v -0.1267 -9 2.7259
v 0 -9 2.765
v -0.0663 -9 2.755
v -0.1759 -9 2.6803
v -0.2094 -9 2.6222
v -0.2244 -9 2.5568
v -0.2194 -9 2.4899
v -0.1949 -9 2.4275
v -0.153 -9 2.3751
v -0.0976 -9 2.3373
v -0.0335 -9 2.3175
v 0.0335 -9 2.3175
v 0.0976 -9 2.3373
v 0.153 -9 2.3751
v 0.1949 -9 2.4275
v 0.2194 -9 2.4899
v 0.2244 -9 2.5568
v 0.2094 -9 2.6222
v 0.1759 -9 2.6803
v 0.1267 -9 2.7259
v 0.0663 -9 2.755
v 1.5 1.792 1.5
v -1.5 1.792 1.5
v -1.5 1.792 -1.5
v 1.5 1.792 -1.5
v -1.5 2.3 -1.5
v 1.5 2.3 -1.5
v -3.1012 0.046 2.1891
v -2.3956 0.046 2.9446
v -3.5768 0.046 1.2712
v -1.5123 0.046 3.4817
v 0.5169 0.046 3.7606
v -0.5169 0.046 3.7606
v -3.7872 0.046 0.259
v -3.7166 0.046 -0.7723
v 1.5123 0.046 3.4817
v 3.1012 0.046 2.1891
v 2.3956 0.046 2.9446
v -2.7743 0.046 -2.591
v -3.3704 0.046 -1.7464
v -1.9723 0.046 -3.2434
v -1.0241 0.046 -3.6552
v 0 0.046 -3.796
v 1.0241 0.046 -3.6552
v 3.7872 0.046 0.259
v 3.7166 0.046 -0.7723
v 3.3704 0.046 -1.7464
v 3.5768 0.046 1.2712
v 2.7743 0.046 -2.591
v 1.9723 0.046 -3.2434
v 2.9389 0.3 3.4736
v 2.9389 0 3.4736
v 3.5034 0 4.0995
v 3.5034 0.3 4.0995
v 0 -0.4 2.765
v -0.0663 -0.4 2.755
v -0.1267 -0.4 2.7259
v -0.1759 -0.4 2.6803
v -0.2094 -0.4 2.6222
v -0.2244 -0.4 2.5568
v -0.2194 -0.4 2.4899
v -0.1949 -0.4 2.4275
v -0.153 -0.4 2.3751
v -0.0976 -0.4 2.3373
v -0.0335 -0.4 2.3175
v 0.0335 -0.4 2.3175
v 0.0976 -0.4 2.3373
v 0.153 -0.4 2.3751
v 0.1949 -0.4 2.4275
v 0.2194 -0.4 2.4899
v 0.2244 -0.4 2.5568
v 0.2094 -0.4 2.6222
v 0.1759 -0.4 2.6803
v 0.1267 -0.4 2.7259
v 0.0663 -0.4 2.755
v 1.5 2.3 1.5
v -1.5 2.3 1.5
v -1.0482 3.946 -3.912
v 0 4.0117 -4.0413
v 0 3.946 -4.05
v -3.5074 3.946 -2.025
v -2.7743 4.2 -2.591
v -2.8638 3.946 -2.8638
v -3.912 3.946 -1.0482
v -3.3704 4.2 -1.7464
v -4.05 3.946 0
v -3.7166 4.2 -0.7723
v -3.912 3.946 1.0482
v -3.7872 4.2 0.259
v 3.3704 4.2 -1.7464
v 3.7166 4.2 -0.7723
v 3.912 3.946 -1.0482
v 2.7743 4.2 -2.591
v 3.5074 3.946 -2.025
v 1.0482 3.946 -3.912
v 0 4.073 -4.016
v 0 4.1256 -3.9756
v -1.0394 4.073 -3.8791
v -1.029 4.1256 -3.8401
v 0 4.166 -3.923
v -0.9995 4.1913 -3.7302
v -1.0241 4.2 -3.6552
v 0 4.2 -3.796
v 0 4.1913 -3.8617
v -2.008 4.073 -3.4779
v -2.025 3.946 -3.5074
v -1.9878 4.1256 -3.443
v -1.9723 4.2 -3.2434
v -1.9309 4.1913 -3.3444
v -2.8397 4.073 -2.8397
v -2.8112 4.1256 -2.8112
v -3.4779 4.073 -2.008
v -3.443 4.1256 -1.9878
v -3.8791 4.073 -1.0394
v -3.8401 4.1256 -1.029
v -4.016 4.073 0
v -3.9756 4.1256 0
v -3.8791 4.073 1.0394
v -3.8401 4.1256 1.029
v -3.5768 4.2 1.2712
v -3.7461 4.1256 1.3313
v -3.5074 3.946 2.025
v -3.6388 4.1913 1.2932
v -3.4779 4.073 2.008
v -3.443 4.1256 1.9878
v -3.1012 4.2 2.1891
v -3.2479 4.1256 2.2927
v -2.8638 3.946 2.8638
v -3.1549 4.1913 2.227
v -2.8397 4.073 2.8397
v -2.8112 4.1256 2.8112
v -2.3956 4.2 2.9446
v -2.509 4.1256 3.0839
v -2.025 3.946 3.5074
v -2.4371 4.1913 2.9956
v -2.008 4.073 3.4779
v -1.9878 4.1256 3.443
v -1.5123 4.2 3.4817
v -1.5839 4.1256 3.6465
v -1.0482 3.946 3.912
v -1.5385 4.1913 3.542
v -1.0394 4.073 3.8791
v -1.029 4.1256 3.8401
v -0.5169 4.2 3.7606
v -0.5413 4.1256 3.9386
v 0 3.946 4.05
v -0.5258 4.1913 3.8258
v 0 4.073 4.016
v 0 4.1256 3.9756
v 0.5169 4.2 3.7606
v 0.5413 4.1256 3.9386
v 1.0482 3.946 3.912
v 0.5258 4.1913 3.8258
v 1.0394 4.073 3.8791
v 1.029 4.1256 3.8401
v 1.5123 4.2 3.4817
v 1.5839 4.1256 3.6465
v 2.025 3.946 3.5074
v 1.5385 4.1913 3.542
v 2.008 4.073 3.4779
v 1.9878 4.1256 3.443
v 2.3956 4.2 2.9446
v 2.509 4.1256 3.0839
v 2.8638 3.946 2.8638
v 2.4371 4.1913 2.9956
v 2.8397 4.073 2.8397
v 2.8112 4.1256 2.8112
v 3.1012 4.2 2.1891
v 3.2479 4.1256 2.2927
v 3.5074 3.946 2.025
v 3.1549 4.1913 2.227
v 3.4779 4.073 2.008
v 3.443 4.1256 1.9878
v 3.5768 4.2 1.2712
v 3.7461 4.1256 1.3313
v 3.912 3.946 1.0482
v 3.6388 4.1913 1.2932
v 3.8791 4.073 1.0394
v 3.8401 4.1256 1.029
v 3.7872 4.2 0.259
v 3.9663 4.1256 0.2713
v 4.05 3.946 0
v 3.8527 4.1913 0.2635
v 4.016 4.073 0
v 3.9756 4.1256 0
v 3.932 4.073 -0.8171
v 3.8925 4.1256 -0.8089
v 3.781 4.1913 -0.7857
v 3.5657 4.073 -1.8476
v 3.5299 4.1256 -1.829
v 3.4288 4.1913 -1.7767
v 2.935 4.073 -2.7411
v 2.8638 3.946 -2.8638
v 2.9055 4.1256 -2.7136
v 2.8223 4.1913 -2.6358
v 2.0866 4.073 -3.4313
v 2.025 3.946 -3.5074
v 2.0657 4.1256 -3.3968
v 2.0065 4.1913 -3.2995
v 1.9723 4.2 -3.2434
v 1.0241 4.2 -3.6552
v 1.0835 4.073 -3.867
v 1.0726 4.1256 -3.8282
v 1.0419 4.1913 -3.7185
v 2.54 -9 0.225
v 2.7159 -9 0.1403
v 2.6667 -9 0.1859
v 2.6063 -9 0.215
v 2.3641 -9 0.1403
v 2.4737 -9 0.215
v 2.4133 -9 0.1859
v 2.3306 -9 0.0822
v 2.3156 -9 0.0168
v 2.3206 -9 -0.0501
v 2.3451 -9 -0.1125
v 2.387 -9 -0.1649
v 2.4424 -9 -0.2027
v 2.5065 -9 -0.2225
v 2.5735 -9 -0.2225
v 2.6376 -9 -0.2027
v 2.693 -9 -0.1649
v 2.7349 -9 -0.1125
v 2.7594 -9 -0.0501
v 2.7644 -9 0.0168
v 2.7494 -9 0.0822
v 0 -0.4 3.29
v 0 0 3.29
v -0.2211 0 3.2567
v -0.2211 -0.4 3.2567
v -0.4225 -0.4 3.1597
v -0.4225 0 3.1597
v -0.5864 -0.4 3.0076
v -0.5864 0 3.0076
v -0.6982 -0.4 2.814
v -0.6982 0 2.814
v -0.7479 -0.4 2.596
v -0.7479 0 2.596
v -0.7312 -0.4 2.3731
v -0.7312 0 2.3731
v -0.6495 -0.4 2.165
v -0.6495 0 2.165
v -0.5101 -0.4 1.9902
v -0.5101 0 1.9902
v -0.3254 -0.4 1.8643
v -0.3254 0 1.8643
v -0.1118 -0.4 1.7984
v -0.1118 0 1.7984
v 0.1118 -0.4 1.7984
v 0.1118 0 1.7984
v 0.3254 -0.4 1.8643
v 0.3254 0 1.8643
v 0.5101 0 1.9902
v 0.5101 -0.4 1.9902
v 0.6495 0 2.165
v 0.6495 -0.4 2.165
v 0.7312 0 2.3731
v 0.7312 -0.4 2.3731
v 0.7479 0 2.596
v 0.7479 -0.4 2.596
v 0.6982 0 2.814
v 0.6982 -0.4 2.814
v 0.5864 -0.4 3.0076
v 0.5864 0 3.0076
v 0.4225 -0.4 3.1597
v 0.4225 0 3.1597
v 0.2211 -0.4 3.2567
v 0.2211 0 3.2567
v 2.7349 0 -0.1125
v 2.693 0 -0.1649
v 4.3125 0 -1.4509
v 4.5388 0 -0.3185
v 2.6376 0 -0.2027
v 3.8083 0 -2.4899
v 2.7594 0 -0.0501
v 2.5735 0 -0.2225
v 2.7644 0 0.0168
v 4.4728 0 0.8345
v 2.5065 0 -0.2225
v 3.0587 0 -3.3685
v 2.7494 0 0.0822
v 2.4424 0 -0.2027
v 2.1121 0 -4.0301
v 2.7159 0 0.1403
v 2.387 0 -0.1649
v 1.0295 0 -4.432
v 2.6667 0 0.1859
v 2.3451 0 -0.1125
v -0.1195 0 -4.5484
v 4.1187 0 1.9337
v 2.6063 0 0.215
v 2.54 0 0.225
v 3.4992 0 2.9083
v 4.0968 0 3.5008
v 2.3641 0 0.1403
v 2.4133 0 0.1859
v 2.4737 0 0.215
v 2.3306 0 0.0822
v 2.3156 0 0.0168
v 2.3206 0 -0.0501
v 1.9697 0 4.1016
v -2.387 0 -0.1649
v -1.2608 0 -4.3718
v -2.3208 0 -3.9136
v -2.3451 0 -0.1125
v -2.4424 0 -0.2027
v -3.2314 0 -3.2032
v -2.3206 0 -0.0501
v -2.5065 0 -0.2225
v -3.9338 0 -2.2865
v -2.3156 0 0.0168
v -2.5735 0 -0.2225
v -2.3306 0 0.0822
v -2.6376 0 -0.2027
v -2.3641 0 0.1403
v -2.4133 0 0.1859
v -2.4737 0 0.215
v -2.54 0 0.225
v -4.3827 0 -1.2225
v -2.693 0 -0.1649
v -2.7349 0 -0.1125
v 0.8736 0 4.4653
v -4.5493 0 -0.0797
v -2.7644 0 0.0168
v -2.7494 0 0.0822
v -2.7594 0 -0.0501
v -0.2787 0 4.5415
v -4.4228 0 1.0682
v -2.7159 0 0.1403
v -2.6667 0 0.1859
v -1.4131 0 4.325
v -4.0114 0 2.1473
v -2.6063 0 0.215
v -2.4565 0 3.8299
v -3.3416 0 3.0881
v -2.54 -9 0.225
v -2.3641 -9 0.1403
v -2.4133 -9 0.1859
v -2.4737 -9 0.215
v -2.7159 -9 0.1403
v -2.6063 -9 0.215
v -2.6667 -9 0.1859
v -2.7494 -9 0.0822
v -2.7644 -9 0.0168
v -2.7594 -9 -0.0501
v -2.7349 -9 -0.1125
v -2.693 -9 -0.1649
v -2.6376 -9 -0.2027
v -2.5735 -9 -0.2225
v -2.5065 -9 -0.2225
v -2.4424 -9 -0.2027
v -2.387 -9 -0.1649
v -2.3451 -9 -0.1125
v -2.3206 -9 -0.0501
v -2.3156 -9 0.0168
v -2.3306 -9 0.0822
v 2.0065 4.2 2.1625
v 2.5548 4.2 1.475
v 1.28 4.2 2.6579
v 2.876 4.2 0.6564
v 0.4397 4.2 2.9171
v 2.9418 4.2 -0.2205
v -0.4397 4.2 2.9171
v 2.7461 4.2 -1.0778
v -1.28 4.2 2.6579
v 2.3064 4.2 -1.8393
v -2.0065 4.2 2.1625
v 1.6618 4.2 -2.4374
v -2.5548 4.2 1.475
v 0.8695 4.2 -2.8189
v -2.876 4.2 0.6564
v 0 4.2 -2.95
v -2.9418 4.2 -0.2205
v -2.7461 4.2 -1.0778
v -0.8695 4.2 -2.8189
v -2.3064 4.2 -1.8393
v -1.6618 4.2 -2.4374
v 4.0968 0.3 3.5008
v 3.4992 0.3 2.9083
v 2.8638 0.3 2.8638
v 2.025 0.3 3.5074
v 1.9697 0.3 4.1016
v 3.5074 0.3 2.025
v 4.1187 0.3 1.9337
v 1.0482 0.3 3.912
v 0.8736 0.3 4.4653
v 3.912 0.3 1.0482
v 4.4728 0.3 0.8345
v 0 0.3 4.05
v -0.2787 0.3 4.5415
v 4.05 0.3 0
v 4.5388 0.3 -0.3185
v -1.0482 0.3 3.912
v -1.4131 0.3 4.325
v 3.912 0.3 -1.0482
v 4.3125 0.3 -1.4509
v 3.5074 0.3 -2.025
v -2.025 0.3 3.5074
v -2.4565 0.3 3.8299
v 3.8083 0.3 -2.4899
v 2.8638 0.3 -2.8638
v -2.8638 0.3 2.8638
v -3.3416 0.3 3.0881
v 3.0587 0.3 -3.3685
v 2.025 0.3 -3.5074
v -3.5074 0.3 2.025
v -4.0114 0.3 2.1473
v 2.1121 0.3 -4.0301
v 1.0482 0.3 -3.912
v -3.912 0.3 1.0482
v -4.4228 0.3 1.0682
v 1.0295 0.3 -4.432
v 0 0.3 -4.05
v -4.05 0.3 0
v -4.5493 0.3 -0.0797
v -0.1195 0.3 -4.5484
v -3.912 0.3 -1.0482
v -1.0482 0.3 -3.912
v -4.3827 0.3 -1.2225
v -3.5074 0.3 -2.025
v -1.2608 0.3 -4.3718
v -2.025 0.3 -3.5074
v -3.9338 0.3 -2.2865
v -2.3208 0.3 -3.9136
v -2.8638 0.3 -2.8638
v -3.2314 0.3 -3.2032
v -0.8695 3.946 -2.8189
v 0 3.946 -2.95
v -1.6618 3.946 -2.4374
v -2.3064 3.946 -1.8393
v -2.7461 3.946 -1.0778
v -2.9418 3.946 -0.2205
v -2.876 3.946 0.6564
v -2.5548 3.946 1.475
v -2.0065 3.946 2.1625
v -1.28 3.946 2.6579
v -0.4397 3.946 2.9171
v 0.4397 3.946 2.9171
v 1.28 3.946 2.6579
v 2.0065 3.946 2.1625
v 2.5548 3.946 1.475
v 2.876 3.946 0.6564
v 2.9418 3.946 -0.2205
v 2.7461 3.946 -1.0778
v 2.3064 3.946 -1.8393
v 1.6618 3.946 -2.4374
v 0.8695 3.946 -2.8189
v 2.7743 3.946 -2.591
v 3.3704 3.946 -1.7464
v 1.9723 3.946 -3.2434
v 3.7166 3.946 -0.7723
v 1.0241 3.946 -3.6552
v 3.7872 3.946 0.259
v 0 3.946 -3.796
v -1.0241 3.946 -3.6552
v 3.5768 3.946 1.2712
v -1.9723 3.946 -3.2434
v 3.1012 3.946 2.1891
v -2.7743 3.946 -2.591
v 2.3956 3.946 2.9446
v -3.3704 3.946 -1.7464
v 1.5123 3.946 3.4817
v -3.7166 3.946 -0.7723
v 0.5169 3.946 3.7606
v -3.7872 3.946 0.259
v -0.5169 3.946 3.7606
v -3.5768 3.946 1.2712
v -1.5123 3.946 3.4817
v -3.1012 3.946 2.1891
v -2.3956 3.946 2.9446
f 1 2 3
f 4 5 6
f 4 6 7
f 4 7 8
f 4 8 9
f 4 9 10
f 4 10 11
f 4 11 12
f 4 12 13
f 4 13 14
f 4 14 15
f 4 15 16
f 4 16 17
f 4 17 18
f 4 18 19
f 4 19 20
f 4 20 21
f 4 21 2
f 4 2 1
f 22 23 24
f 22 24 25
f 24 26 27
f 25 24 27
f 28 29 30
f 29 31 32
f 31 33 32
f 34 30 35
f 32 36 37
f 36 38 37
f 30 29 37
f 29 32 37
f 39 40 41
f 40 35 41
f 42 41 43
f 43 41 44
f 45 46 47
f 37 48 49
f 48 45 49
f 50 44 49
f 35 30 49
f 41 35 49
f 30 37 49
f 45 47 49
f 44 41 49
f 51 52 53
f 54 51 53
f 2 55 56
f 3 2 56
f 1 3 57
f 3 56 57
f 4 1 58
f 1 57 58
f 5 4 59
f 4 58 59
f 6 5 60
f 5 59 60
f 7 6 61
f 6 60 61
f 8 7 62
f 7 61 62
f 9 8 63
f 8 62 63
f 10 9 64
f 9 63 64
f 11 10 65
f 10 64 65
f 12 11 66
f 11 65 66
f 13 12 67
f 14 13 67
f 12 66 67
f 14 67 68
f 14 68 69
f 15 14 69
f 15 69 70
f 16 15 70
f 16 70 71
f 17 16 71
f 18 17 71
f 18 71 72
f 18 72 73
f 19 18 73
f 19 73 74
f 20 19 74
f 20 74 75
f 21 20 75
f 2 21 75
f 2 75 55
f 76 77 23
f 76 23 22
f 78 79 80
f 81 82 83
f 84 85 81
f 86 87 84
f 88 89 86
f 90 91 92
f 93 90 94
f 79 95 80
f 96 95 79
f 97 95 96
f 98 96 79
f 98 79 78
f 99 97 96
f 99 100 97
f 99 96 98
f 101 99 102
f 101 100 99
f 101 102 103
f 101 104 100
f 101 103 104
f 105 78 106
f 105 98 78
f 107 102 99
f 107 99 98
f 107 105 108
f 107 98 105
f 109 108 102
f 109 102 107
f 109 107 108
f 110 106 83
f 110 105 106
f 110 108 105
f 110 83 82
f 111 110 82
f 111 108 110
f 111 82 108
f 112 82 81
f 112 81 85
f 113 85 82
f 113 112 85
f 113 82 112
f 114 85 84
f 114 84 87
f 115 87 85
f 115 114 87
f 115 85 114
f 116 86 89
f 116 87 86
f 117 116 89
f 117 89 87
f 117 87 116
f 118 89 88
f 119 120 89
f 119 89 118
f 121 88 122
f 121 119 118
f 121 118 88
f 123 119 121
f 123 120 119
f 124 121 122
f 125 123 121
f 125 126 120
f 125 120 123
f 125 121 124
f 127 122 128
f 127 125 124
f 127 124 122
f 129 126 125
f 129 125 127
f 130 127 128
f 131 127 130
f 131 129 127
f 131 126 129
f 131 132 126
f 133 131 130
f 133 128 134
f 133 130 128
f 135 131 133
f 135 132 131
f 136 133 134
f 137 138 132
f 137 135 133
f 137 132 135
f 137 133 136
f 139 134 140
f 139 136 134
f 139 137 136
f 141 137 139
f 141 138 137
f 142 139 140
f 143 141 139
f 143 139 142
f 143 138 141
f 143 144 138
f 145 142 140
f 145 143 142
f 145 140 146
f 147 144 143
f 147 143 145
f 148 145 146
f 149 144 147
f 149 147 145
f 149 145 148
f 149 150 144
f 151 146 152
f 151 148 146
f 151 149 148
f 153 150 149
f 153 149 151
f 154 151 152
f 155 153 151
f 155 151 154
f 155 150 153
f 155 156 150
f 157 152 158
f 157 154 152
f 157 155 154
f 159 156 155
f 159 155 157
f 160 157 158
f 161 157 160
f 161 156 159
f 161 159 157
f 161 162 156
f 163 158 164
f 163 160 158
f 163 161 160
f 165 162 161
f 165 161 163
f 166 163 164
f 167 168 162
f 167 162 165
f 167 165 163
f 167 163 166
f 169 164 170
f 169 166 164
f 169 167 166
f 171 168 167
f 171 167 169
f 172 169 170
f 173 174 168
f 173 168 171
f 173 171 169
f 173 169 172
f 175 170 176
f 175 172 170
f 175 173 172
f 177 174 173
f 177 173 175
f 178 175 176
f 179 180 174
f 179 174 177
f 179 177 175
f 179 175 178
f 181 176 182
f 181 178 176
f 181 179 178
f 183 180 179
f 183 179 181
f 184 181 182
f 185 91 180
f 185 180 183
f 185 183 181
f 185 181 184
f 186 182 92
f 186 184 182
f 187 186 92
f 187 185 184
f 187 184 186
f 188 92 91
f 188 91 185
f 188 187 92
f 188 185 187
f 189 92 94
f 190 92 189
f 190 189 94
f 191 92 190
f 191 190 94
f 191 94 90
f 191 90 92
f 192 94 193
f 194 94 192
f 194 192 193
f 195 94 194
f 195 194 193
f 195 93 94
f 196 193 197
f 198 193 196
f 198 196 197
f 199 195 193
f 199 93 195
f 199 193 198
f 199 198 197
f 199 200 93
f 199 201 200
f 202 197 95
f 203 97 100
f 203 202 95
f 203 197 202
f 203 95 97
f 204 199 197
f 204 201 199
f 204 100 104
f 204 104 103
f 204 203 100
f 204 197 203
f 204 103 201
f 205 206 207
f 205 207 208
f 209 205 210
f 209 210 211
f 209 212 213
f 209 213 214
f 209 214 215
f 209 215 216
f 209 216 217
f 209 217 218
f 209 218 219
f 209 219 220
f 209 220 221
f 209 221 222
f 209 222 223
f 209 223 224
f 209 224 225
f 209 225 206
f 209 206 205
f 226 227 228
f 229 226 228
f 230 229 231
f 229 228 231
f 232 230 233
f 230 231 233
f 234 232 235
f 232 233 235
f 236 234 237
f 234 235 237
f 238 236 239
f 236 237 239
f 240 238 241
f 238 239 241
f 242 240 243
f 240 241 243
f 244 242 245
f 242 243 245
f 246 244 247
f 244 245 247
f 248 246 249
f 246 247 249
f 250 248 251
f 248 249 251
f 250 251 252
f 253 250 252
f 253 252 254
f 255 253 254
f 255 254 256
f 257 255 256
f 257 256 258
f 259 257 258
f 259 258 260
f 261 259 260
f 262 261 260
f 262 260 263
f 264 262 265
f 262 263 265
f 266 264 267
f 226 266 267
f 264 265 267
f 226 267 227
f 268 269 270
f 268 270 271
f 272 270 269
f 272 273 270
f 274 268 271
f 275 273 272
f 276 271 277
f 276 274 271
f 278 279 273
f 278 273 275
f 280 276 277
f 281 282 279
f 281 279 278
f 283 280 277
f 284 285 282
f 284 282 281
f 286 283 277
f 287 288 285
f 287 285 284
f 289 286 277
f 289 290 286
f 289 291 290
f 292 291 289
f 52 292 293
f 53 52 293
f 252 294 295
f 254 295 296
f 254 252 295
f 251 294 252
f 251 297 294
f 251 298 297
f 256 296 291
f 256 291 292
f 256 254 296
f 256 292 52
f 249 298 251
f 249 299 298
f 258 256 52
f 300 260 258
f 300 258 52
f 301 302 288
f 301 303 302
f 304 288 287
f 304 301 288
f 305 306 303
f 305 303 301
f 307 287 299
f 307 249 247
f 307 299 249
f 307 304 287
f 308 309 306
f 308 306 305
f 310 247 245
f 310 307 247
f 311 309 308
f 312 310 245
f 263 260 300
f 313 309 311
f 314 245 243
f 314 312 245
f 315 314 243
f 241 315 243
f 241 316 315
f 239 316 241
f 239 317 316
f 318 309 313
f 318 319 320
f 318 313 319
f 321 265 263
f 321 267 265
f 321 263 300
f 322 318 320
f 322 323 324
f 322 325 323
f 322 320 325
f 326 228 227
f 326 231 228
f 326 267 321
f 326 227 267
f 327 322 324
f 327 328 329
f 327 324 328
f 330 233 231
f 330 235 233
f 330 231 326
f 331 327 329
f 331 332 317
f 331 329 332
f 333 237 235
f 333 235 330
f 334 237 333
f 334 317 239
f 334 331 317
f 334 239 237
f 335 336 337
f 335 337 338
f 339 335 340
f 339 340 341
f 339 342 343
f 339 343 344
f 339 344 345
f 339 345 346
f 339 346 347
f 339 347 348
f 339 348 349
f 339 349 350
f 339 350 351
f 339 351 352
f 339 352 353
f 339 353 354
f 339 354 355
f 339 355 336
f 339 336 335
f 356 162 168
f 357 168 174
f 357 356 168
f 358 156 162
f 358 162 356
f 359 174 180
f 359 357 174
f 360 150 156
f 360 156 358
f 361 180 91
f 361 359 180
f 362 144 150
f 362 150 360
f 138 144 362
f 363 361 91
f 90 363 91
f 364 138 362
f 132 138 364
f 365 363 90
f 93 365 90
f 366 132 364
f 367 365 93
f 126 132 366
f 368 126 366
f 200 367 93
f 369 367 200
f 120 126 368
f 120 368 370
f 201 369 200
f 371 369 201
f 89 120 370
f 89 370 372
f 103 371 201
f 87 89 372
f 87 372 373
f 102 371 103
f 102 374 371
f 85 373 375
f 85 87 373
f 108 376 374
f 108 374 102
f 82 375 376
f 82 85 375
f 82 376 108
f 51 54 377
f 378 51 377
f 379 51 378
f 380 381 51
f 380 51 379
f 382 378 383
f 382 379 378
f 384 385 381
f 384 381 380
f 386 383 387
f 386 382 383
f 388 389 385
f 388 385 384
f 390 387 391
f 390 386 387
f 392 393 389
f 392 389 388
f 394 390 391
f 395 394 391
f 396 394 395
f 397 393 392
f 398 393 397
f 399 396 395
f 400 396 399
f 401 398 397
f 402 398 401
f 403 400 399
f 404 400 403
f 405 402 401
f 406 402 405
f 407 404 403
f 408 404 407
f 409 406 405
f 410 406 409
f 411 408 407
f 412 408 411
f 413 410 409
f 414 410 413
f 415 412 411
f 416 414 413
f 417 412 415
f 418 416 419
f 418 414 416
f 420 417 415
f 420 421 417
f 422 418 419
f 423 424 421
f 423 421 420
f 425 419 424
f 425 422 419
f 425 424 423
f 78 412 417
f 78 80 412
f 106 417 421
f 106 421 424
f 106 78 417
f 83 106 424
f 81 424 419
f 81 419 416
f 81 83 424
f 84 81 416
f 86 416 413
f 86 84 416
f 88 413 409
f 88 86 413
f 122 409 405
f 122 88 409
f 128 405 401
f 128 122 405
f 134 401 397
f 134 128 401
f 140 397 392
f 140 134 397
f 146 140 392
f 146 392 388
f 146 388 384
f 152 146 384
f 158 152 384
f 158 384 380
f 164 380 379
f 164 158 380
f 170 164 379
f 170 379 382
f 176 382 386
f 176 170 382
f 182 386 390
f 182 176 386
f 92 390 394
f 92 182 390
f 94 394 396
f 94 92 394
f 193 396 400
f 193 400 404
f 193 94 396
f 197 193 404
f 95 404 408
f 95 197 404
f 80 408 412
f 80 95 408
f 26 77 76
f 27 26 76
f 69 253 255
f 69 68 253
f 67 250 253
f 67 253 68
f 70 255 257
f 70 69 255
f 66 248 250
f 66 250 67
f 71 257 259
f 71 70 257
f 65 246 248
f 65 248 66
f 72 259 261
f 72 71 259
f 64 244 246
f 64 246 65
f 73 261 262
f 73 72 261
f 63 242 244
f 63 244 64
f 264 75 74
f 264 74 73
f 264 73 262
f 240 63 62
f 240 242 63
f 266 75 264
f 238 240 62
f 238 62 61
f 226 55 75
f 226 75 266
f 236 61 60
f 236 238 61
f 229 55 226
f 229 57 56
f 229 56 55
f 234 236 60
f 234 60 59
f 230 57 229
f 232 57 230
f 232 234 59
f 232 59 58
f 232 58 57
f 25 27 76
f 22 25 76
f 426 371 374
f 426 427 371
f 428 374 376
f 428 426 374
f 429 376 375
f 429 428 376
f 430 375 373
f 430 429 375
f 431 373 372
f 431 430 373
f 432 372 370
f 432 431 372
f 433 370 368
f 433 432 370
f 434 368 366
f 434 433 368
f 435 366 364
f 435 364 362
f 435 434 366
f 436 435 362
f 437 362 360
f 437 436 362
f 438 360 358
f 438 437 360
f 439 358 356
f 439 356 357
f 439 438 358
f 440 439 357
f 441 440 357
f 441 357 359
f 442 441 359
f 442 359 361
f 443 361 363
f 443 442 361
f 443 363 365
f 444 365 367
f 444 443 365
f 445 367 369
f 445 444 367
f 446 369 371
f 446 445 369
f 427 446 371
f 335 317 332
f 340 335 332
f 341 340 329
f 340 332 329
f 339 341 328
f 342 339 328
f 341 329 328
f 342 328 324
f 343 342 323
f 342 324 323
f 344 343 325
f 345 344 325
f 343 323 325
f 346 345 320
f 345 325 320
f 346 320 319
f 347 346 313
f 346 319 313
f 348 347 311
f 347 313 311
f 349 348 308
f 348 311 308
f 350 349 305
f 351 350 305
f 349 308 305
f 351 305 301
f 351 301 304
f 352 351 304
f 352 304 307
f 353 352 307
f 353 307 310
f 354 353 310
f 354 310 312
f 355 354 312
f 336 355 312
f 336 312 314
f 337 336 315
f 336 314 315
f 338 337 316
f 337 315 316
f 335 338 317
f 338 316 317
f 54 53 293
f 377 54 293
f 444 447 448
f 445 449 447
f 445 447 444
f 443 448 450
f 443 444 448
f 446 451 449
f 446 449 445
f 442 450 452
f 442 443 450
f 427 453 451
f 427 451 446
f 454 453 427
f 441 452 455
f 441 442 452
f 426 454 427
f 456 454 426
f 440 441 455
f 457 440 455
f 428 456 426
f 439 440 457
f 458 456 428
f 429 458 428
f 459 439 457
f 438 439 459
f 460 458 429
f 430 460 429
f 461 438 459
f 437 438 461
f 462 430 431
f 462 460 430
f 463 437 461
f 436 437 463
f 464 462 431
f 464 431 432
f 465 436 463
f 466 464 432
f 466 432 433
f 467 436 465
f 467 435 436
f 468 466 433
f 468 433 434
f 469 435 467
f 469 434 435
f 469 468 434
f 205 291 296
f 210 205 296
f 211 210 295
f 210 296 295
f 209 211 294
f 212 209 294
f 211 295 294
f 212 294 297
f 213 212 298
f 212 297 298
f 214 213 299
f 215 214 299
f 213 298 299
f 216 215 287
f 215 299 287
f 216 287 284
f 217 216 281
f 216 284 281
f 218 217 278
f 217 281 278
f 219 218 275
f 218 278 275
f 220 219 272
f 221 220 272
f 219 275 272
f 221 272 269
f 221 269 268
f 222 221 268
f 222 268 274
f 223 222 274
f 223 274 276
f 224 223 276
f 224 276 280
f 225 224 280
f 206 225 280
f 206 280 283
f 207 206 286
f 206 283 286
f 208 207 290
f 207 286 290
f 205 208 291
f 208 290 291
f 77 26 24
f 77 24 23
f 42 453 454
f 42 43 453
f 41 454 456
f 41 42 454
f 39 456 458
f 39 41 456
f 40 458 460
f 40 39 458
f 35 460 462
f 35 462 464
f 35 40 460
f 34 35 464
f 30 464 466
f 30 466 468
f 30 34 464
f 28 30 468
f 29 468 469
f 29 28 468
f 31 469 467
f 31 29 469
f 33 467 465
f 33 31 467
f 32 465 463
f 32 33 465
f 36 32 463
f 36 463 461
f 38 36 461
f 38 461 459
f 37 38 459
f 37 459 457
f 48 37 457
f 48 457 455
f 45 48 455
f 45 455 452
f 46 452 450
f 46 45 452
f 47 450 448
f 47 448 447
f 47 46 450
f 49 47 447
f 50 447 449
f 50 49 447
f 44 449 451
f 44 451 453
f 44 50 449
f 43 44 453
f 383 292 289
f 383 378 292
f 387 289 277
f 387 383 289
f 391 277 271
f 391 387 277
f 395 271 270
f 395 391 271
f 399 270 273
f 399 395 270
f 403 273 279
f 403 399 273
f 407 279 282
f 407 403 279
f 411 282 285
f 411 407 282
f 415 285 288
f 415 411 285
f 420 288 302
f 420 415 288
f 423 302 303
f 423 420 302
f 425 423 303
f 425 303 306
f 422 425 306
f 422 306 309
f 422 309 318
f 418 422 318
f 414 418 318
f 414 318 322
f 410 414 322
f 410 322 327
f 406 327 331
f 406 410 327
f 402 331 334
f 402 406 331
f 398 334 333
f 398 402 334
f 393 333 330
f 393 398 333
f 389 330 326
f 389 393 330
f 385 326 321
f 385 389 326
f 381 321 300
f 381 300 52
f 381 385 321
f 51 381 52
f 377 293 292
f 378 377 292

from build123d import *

# Parameters (mm, degrees)
SKETCH2_R           = 4.55
BOSS_EXTRUDE1_DEPTH = 0.046
BOSS_EXTRUDE2_START = -2.3
SKETCH3_W           = 3
SKETCH3_H           = 3
BOSS_EXTRUDE2_DEPTH = 0.508
BOSS_EXTRUDE3_DEPTH = 0.3
SKETCH5_R           = 0.225
BOSS_EXTRUDE4_DEPTH = 9
SKETCH7_R           = 0.75
BOSS_EXTRUDE5_DEPTH = 0.4


with BuildPart() as part:
    # Sketch1 → Revolve-Thin2 (revolve)
    with BuildSketch(Plane.XY, mode=Mode.PRIVATE) as revolve_thin2_sk:
        with BuildLine():
            Line((4.55, 0), (4.55, 0.3))
            Line((4.55, 0.3), (4.05, 0.3))
            Line((4.05, 0.3), (4.05, 3.946))
            ThreePointArc((4.05, 3.946), (3.975605122, 4.125605122), (3.796, 4.2))
            Line((3.796, 4.2), (2.95, 4.2))
            Line((2.95, 4.2), (2.95, 3.946))
            Line((2.95, 3.946), (3.796, 3.946))
            Line((3.796, 3.946), (3.796, 0.046))
            Line((3.796, 0.046), (4.296, 0.046))
            Line((4.296, 0.046), (4.296, 0))
            Line((4.296, 0), (4.55, 0))
        make_face()
    revolve(revolve_thin2_sk.sketch.rotate(Axis((0, 0, 0), (0, 1, 0)), 90), axis=Axis((0, 0, 0), (0, 1, 0)))  # turned: the seam where the file's is

    # Sketch2 → Boss-Extrude1 (add)
    with BuildSketch(Plane.XZ):
        with Locations(Location((0, 0, 0), (0, 0, 270))):  # turned: the seam where the file's is
            Circle(SKETCH2_R)
    extrude(amount=-BOSS_EXTRUDE1_DEPTH)

    # Sketch4 → Boss-Extrude3 (add)
    with BuildSketch(Plane.XZ):
        Polygon((3.499150564, 2.908340649), (2.938865798, 3.473552623), (3.503435617, 4.099455918), (4.096846657, 3.500826355), align=None)
    extrude(amount=-BOSS_EXTRUDE3_DEPTH)

    # Sketch5 → Boss-Extrude4 (add)
    with BuildSketch(Plane.XZ):
        with Locations(Location((-2.54, 0, 0), (0, 0, 90))):  # turned: the seam where the file's is
            Circle(SKETCH5_R)
        with Locations(Location((2.54, 0, 0), (0, 0, 90))):  # turned: the seam where the file's is
            Circle(SKETCH5_R)
        with Locations(Location((0, 2.54, 0), (0, 0, 90))):  # turned: the seam where the file's is
            Circle(SKETCH5_R)
    extrude(amount=BOSS_EXTRUDE4_DEPTH)

    # Sketch7 → Boss-Extrude5 (add)
    with BuildSketch(Plane.XZ):
        with Locations(Location((0, 2.54, 0), (0, 0, 90))):  # turned: the seam where the file's is
            Circle(SKETCH7_R)
    extrude(amount=BOSS_EXTRUDE5_DEPTH)


with BuildPart() as body_2:
    # Sketch3 → Boss-Extrude2 (new body)
    with BuildSketch(Plane.XZ.offset(BOSS_EXTRUDE2_START)):
        Rectangle(SKETCH3_W, SKETCH3_H)
    extrude(amount=BOSS_EXTRUDE2_DEPTH)


solid = Compound([part.part, body_2.part])
